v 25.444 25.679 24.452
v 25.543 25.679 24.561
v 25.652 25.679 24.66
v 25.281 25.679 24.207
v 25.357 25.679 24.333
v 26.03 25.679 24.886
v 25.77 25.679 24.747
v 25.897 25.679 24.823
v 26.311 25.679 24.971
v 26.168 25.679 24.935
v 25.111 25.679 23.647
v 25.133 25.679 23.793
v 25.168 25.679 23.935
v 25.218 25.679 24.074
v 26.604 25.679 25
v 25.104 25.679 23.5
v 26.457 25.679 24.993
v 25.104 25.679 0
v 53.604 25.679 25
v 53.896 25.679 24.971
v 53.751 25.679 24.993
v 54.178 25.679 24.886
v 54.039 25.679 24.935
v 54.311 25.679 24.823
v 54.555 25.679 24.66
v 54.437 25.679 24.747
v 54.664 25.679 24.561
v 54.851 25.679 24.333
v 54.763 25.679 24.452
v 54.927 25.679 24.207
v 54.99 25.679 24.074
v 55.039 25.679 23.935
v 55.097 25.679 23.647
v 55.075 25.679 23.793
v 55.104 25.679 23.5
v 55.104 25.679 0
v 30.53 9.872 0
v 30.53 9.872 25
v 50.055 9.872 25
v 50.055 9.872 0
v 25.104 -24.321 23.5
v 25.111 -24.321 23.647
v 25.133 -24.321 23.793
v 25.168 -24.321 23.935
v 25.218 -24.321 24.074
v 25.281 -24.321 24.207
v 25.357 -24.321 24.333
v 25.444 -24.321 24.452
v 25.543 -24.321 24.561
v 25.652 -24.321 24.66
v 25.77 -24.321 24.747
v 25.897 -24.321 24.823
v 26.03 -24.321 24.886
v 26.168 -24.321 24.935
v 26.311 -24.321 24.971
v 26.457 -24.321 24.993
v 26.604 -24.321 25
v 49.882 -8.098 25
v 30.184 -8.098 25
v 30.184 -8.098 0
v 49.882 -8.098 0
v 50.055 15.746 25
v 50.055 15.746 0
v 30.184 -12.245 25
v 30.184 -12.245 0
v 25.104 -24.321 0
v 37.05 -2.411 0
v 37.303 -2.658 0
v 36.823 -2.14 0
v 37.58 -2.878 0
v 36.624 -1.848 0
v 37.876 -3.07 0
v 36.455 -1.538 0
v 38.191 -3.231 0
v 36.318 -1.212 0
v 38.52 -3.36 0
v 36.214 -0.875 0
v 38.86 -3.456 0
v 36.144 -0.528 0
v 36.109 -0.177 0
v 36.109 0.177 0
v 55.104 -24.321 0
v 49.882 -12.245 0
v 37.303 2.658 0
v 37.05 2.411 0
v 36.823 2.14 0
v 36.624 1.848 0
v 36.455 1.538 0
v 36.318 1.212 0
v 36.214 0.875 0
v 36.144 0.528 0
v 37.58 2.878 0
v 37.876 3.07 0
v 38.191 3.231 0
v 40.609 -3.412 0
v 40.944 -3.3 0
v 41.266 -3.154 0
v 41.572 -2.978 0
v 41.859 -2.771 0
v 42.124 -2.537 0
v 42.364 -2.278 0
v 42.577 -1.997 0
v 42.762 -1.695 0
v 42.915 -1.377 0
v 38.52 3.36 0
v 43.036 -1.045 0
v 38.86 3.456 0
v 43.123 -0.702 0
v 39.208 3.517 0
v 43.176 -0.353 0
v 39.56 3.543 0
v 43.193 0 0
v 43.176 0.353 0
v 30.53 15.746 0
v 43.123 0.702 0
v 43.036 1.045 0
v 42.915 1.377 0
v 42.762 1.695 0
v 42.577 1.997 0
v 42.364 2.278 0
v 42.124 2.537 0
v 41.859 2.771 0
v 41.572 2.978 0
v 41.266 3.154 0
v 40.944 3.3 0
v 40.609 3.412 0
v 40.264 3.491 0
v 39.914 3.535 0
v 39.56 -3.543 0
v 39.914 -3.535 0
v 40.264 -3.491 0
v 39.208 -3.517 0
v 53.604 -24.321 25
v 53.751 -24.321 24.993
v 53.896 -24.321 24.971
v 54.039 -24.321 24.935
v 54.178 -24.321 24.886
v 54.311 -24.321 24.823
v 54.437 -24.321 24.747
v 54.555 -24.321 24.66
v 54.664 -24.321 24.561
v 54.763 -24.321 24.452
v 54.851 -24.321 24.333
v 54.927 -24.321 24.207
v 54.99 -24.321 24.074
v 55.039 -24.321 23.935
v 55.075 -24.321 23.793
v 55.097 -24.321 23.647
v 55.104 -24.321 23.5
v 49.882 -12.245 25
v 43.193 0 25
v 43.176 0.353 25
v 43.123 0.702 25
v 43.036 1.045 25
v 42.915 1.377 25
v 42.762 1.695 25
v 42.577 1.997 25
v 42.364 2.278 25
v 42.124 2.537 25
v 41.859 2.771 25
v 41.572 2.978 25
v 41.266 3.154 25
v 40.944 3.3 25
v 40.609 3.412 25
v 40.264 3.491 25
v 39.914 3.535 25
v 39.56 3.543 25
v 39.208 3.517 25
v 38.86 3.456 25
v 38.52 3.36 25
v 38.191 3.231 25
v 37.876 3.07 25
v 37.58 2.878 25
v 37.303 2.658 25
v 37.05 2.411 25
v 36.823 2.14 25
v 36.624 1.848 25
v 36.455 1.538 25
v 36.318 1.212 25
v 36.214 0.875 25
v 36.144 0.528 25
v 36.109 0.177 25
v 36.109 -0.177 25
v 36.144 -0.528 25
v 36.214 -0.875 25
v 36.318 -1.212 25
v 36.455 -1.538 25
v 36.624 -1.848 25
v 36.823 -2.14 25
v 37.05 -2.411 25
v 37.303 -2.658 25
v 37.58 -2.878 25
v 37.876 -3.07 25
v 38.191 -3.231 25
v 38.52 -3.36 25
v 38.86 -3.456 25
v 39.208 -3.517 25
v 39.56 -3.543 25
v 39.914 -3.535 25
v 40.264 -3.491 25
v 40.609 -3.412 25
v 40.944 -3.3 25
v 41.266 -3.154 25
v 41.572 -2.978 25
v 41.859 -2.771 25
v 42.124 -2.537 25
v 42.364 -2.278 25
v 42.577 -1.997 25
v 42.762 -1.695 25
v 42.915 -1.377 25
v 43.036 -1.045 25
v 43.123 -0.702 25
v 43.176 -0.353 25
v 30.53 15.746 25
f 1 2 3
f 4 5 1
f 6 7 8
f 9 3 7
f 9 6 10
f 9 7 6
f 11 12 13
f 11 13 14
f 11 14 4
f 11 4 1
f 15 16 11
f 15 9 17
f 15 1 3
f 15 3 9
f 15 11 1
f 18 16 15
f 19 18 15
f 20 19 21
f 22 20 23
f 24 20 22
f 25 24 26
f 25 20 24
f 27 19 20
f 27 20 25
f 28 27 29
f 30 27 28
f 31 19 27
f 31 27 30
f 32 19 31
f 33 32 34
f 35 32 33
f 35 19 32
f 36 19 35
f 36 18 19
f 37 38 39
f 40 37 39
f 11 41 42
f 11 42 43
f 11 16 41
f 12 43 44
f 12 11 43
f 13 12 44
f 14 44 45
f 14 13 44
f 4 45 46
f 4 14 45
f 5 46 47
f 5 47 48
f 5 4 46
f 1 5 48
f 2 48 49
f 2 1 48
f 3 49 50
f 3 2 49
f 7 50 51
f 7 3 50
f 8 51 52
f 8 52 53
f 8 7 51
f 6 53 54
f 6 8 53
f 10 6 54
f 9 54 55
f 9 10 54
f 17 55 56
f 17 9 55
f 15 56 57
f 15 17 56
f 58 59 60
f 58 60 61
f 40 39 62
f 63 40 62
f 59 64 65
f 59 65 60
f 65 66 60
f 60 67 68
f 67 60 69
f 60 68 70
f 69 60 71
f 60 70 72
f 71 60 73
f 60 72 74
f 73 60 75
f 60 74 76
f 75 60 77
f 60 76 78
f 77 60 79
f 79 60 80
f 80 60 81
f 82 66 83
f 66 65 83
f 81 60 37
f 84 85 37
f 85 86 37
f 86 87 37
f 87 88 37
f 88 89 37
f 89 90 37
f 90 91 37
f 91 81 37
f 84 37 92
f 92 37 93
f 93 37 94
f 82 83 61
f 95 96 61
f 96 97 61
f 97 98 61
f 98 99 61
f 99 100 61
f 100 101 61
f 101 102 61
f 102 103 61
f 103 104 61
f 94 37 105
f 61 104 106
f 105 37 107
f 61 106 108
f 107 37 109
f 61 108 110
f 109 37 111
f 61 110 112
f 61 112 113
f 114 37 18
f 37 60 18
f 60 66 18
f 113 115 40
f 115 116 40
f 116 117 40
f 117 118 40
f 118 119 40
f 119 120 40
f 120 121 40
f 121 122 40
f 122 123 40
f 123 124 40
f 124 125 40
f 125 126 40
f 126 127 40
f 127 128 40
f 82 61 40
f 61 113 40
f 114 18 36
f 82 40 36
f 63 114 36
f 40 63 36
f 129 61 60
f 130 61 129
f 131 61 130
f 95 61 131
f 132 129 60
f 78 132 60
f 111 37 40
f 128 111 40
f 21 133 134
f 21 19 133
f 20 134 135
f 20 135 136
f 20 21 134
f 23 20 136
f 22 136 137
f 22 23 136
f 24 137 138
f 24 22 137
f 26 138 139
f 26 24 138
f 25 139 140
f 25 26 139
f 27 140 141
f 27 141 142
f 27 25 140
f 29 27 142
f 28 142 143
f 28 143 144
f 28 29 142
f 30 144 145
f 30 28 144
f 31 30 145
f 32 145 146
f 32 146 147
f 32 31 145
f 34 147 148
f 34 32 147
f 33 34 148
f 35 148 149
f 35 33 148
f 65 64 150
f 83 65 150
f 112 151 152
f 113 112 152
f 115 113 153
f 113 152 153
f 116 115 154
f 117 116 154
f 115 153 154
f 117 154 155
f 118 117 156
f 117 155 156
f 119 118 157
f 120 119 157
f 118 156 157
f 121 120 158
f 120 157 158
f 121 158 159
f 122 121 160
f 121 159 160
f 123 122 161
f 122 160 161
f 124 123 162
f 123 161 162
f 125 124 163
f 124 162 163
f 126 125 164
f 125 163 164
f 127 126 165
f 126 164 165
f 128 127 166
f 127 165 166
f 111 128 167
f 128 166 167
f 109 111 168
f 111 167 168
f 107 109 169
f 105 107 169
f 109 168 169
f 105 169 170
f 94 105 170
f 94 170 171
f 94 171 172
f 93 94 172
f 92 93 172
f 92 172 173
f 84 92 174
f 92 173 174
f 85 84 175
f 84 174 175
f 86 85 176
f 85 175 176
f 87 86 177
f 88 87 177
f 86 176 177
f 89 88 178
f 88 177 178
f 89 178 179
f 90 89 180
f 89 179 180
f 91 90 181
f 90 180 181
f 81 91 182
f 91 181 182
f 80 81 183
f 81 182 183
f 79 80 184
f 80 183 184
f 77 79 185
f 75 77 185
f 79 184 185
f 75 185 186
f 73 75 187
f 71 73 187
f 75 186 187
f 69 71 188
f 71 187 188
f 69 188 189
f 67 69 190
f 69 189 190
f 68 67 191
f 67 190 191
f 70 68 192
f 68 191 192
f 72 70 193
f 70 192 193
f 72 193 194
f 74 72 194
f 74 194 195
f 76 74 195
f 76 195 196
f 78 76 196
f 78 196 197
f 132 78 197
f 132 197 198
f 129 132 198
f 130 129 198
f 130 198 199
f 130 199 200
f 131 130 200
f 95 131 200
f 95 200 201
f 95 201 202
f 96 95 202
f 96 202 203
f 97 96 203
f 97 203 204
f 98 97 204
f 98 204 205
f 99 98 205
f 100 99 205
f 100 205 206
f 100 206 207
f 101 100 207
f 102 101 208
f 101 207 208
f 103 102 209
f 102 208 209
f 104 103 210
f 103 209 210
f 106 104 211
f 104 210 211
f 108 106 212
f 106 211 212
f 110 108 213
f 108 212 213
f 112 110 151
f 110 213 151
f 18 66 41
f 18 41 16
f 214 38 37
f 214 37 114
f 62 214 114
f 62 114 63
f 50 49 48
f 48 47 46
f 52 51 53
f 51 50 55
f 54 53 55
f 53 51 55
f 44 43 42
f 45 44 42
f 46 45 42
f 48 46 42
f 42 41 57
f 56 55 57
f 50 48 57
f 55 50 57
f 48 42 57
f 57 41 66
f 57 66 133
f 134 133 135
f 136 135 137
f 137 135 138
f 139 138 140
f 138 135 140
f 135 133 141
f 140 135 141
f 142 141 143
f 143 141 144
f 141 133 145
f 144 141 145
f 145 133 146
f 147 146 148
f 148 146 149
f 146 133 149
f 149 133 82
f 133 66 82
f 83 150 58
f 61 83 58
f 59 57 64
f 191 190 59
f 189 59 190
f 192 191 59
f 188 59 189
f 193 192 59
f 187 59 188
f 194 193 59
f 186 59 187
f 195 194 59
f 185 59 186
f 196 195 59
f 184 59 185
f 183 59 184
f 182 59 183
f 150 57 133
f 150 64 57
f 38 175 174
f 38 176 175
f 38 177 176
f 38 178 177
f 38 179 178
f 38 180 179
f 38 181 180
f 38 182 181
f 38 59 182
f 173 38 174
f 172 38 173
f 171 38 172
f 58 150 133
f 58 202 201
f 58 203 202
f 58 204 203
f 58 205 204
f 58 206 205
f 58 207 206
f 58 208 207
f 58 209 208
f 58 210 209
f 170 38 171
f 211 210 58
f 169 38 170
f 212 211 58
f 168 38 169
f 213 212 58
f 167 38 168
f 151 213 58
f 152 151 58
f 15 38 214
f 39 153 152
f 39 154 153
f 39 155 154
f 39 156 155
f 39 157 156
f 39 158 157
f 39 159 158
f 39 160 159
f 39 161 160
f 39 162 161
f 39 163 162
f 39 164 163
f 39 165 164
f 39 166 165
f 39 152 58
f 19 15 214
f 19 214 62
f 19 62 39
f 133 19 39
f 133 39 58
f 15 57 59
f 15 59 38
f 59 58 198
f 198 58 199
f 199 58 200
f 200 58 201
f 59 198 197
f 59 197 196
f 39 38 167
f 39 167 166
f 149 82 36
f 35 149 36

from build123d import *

# Parameters (mm, degrees)
F0_W     = 30
F0_H     = 50
F1_DEPTH = 25
F2_W     = 19.697615
F2_H     = 4.146867
F2_W_2   = 19.52483
F2_H_2   = 5.874727
F3_DEPTH = 10
F4_DEPTH = 10
F5_DEPTH = 25
F6_DEPTH = 25
F7_R     = 1.5
F2_R     = 3.544564
F8_DEPTH = 25


with BuildPart() as f1:
    # F0 (on Top) → F1 (new body)
    with BuildSketch(Plane.XY):
        with Locations((40.103809, 0.678835)):
            Rectangle(F0_W, F0_H)
    extrude(amount=F1_DEPTH)

    # F2 (on face) → F3 (join)
    with BuildSketch(Plane.XY.offset(25)):
        with Locations((40.032959, -10.171571)):
            Rectangle(F2_W, F2_H)
        with Locations((40.292139, 12.808978)):
            Rectangle(F2_W_2, F2_H_2)
    extrude(amount=-F3_DEPTH)

    # F2 (on face) → F4 (join)
    with BuildSketch(Plane.XY.offset(25)):
        with Locations((40.292139, 12.808978)):
            Rectangle(F2_W_2, F2_H_2)
        with Locations((40.032959, -10.171571)):
            Rectangle(F2_W, F2_H)
    extrude(amount=-F4_DEPTH)

    # F2 (on face) → F5 (cut)
    with BuildSketch(Plane.XY.offset(25)):
        with Locations((40.292139, 12.808978)):
            Rectangle(F2_W_2, F2_H_2)
    extrude(amount=-F5_DEPTH, mode=Mode.SUBTRACT)

    # F2 (on face) → F6 (cut)
    with BuildSketch(Plane.XY.offset(25)):
        with Locations((40.032959, -10.171571)):
            Rectangle(F2_W, F2_H)
    extrude(amount=-F6_DEPTH, mode=Mode.SUBTRACT)

    # F7
    f7_edges = [f1.edges().sort_by_distance(p)[0] for p in [
        (55.103809, 0.678835, 25),
        (25.103809, 0.678835, 25),
    ]]
    fillet(f7_edges, radius=F7_R)

    # F2 (on face) → F8 (cut)
    with BuildSketch(Plane.XY.offset(25)):
        with Locations((39.648701, 0)):
            Circle(F2_R)
    extrude(amount=-F8_DEPTH, mode=Mode.SUBTRACT)


solid = f1.part
